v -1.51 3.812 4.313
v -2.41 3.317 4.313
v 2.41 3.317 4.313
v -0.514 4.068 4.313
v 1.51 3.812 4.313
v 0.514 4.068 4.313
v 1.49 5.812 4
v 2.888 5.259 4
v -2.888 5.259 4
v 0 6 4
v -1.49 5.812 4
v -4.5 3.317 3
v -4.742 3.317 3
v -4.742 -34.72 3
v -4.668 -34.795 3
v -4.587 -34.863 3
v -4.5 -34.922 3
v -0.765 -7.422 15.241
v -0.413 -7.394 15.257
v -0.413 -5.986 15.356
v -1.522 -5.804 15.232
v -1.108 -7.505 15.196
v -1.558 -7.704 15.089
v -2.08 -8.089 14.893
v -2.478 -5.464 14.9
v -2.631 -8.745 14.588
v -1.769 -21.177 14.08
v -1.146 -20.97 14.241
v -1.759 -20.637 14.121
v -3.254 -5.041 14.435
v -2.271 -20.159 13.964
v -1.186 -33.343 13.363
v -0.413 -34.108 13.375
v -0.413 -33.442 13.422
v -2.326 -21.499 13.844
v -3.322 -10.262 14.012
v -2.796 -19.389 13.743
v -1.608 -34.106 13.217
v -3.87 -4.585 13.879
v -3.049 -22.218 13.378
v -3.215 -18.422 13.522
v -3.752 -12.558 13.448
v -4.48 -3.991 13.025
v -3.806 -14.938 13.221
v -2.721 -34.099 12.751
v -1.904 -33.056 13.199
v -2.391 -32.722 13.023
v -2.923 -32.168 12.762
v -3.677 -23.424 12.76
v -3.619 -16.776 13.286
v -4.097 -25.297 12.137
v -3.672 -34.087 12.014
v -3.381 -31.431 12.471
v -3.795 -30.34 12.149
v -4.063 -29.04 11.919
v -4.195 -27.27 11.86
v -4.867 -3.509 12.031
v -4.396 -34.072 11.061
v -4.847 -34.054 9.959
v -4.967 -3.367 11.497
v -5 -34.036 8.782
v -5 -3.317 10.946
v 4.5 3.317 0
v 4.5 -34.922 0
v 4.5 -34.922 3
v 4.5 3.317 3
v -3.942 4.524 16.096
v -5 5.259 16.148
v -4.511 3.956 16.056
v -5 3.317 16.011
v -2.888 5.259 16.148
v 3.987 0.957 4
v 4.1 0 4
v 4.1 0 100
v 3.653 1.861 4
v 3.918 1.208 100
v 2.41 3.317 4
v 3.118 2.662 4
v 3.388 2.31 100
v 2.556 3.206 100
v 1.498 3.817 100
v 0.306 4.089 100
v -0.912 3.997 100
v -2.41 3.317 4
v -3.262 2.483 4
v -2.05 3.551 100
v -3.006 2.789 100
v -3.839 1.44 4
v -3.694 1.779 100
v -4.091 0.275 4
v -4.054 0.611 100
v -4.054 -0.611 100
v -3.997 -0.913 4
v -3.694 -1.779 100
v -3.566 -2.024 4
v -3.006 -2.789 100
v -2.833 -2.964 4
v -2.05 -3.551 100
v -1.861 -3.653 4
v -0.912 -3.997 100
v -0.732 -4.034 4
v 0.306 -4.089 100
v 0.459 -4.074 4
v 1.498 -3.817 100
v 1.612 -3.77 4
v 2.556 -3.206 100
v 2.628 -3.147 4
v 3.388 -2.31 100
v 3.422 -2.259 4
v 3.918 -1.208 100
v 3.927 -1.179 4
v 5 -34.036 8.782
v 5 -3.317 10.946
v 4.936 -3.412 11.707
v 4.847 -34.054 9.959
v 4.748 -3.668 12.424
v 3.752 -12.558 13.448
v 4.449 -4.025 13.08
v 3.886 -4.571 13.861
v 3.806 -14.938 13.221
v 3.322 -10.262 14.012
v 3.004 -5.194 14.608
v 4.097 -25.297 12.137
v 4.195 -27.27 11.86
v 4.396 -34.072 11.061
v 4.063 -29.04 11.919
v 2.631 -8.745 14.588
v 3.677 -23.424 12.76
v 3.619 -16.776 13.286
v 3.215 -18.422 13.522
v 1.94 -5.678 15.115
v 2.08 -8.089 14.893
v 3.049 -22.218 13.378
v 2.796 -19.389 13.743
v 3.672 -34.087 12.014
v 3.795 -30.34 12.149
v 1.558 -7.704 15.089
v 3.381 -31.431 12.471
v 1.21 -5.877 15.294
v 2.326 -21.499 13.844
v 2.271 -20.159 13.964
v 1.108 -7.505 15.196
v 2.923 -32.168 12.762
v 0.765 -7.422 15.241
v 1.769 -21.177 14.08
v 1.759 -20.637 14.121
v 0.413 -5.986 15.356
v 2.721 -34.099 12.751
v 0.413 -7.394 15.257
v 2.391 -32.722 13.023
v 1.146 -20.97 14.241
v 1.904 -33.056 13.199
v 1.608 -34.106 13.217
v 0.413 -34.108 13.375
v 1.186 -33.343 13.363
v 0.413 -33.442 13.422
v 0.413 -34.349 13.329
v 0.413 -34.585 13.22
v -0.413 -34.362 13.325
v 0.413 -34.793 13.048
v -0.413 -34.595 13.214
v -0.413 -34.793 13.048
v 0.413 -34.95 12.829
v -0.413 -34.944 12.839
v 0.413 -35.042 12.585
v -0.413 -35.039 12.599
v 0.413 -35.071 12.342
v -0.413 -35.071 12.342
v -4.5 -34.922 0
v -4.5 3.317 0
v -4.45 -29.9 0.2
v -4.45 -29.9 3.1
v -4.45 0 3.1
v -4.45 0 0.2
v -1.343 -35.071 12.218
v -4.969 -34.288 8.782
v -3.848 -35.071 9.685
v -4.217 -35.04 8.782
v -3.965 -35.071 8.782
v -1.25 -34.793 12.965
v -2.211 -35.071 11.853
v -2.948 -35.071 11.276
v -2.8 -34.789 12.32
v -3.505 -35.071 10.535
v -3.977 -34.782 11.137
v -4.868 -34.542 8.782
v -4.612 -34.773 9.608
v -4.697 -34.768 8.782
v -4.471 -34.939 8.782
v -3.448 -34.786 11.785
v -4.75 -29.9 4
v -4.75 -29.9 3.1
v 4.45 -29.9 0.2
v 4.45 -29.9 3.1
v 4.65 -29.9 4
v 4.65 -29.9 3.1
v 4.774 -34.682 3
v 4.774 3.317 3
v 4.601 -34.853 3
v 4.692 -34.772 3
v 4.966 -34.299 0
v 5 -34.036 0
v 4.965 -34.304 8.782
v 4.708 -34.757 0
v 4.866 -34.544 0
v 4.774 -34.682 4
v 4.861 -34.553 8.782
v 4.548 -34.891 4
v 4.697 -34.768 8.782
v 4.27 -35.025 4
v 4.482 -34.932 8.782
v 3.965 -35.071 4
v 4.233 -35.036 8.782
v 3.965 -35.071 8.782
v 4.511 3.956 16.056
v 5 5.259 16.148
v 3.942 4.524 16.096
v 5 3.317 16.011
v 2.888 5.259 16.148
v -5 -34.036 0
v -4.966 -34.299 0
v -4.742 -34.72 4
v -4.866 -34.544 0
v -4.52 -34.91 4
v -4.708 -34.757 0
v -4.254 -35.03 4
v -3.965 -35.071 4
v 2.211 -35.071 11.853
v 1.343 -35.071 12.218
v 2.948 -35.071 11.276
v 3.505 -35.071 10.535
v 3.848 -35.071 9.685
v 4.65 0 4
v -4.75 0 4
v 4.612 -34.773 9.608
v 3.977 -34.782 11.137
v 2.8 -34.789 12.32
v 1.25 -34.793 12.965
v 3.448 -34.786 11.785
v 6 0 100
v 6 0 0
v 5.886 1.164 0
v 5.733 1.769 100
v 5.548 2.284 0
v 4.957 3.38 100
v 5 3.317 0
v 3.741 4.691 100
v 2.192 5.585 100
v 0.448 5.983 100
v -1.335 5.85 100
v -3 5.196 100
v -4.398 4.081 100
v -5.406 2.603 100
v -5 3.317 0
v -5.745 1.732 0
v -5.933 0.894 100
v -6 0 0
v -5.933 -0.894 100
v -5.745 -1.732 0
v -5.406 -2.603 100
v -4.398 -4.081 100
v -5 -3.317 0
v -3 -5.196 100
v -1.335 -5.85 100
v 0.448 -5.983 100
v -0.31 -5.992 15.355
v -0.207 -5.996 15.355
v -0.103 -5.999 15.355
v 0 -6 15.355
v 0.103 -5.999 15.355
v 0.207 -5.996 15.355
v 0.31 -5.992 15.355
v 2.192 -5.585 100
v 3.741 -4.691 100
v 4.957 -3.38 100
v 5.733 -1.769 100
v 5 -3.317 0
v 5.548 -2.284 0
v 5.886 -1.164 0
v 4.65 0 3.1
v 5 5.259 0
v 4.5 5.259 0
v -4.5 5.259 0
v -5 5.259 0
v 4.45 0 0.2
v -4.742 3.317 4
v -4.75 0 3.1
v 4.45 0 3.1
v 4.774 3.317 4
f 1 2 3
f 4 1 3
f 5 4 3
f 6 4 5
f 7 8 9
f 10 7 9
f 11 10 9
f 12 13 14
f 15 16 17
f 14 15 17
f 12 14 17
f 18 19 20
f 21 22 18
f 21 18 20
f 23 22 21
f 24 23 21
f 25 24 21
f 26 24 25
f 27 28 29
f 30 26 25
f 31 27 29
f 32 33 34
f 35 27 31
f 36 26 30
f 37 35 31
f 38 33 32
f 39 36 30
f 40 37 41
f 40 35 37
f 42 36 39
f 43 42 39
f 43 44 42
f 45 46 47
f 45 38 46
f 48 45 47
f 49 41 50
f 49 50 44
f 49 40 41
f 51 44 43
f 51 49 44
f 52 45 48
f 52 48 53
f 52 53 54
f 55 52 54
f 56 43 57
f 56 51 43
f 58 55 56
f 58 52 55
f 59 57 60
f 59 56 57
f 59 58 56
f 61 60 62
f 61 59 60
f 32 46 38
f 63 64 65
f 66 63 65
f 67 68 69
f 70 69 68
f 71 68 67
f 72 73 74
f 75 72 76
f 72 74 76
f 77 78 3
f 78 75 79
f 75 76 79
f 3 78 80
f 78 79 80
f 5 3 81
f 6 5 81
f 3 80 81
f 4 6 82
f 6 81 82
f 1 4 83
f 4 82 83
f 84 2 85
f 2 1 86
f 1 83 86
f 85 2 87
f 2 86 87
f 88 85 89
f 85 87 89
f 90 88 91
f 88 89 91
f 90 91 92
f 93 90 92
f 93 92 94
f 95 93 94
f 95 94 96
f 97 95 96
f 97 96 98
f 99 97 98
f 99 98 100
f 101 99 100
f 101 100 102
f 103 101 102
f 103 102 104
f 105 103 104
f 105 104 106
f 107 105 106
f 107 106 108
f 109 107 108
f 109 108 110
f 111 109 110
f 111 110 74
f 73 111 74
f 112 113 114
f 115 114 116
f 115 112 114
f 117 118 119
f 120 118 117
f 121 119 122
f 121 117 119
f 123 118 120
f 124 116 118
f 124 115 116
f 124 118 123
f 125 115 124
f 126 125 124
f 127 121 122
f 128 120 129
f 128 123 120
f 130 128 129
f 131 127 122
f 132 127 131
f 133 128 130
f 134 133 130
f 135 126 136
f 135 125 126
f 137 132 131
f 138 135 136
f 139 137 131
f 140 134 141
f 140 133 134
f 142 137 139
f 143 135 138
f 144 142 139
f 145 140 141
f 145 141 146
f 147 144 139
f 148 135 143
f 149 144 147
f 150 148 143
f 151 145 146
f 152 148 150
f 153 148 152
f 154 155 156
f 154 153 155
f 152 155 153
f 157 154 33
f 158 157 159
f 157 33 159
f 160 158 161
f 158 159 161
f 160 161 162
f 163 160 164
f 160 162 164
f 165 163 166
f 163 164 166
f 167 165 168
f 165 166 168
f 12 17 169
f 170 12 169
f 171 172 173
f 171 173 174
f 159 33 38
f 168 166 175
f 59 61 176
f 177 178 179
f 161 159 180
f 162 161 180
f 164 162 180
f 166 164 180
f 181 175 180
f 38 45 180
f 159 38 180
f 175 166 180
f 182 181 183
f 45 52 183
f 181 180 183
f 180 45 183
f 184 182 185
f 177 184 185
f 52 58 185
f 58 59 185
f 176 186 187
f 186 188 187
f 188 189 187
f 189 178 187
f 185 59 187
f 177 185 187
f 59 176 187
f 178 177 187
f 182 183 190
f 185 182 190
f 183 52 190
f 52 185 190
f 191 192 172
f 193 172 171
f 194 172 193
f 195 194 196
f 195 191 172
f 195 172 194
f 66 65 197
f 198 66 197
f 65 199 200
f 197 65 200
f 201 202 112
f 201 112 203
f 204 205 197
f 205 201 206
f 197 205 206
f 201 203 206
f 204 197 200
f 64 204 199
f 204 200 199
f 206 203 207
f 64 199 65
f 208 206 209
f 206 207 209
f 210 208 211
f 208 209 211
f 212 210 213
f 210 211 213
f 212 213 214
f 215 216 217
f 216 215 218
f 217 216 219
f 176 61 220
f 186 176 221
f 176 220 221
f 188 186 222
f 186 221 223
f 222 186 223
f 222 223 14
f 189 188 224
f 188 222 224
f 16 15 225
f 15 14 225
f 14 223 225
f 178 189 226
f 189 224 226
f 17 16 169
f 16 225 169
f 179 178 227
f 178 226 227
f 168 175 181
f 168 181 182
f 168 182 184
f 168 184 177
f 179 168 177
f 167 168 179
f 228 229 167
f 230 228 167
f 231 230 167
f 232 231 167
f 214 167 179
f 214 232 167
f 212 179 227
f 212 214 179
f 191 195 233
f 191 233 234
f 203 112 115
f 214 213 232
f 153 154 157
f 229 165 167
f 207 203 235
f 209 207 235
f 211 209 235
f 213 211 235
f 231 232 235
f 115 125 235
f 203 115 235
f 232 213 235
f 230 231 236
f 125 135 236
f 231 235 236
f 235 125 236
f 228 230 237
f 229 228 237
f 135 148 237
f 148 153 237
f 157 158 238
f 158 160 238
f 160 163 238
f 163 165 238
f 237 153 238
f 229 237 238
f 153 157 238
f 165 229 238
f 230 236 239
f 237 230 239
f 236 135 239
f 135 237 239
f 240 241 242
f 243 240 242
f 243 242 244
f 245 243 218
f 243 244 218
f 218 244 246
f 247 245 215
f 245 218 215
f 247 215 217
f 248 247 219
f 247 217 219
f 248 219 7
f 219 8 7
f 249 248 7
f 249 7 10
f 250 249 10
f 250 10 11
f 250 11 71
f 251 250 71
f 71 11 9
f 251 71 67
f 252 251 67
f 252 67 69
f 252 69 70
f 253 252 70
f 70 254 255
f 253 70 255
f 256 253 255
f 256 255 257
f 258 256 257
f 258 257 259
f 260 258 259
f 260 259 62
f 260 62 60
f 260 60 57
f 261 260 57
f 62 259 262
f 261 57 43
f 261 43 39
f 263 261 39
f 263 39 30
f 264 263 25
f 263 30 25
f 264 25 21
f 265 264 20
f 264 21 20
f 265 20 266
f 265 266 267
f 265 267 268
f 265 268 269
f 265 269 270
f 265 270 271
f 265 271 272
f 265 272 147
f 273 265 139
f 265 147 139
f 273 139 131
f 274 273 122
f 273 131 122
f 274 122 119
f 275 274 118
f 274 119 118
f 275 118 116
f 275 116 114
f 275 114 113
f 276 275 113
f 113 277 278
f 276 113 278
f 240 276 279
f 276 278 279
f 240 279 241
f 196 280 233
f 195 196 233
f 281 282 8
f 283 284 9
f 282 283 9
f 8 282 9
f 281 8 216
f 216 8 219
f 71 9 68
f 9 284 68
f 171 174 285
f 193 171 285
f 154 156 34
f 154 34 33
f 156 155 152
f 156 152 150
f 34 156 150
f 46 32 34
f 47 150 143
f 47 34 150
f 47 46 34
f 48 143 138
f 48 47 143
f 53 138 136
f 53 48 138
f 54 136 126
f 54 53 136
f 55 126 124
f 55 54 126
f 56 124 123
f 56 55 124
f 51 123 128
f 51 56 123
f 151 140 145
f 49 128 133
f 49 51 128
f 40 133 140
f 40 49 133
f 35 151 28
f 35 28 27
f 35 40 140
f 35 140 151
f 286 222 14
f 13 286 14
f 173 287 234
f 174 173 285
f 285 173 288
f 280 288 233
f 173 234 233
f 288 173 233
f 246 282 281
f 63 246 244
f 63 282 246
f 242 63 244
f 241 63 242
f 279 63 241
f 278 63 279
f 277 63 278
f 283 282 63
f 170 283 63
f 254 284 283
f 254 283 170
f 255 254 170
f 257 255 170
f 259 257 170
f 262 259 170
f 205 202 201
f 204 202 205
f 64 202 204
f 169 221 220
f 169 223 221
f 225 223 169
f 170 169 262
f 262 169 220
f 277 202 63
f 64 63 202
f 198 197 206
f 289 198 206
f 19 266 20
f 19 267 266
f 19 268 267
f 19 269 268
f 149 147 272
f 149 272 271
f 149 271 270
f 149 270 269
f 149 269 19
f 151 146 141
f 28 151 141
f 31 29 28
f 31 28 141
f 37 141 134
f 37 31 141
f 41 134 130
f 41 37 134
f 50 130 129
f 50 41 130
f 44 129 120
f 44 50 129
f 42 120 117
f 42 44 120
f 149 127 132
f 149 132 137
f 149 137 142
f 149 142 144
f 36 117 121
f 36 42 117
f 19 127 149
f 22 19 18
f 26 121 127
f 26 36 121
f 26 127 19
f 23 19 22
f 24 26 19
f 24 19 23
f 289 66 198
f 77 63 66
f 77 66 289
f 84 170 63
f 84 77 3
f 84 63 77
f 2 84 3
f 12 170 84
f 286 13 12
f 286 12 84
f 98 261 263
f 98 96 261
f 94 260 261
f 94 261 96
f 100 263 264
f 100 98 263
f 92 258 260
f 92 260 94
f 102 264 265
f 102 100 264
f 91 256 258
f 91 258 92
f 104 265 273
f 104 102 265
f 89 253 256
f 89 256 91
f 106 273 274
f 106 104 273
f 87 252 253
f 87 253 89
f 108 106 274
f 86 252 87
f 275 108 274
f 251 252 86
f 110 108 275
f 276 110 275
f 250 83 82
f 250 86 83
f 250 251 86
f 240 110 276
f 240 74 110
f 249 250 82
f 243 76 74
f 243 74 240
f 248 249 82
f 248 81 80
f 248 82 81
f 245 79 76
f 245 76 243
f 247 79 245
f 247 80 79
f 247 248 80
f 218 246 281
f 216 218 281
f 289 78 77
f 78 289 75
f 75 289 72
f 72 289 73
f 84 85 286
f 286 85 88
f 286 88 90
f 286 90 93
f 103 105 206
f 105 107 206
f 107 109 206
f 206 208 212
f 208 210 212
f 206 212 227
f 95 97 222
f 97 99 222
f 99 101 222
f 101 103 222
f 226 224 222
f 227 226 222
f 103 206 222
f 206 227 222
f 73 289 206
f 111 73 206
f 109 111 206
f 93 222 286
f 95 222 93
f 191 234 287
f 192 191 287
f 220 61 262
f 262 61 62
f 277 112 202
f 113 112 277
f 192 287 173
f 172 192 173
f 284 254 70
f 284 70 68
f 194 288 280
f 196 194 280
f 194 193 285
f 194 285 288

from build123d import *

# Parameters (mm, degrees)
F0_R           = 6
F1_DEPTH       = 100
F3_DEPTH       = 5
F3_DEPTH_BACK  = 5
F4_R           = 4.1
F5_DEPTH       = 125.4
F7_DEPTH       = 41.0720824132
F9_DEPTH       = 29.9
F10_W          = 1.9428639189
F10_H          = 4.3132465668
F11_DEPTH      = 9.9
F12_R          = 4.5870057685
F13_R          = 1.0354074261
F15_DEPTH      = 25
F15_DEPTH_BACK = 25


with BuildPart() as f1:
    # F0 (on Top) → F1 (new body)
    with BuildSketch(Plane.XY):
        Circle(F0_R)
    extrude(amount=F1_DEPTH)

    # F2 (on Right) → F3 (join, two sides)
    with BuildSketch(Plane.YZ) as f3_sk:
        Polygon((-35.0710824132, 13.3073087782), (-35.0710824132, 0), (5.2594887093, 0), (5.2594887093, 16.1479860544), align=None)
    extrude(amount=F3_DEPTH)
    extrude(f3_sk.sketch, amount=-F3_DEPTH_BACK)

    # F4 (on face) → F5 (cut)
    with BuildSketch(Plane.XY.offset(100)):
        Circle(F4_R)
    extrude(amount=-F5_DEPTH, mode=Mode.SUBTRACT)

    # F6 (on face) → F7 (cut, through all)
    with BuildSketch(Plane.XZ.offset(35.0710824132)):
        Polygon((-4.5, 3), (-4.5, 0), (4.5, 0), (4.5, 3), (4.773848962, 3), (4.773848962, 4), (-4.741775997, 4), (-4.741775997, 3), align=None)
    extrude(amount=-F7_DEPTH, mode=Mode.SUBTRACT)

    # F10 (on face) → F11 (join)
    with BuildSketch(Plane(origin=(-5, 0, 0), x_dir=(0, -1, 0), z_dir=(-1, 0, 0))):
        with Locations((-4.2880567498, 2.1566232834)):
            Rectangle(F10_W, F10_H)
    extrude(amount=-F11_DEPTH)

    # F12
    f12_edges = [f1.edges().sort_by_distance(p)[0] for p in [
        (5, -19.193854, 14.425619),
        (-5, -19.193854, 14.425619),
    ]]
    fillet(f12_edges, radius=F12_R)

    # F13
    f13_edges = [f1.edges().sort_by_distance(p)[0] for p in [
        (3.658503, -35.071082, 11.958465),
        (-3.658503, -35.071082, 11.958465),
        (0, -35.071082, 13.307309),
    ]]
    fillet(f13_edges, radius=F13_R)

    # F14 (on Right) → F15 (cut, two sides)
    with BuildSketch(Plane.YZ) as f15_sk:
        with BuildLine():
            Line((-6.6120252013, 15.7186705619), (-33.9181585425, 13.7271391695))
            ThreePointArc((-33.9181585425, 13.7271391695), (-27.3596972557, 11.856128674), (-20.9703044678, 14.2414493078))
            ThreePointArc((-20.9703044678, 14.2414493078), (-13.6186487576, 13.3032400244), (-6.6120252013, 15.7186705619))
        make_face()
    extrude(amount=-F15_DEPTH, mode=Mode.SUBTRACT)
    extrude(f15_sk.sketch, amount=F15_DEPTH_BACK, mode=Mode.SUBTRACT)


with BuildPart() as f9:
    # F8 (on Front) → F9 (new body)
    with BuildSketch(Plane.XZ):
        Polygon((-4.45, 3.1), (-4.45, 0.2), (4.45, 0.2), (4.45, 3.1), (4.6502057618, 3.1), (4.6502057618, 4), (-4.7497942382, 4), (-4.7497942382, 3.1), align=None)
    extrude(amount=F9_DEPTH)


solid = Compound([f1.part, f9.part])
